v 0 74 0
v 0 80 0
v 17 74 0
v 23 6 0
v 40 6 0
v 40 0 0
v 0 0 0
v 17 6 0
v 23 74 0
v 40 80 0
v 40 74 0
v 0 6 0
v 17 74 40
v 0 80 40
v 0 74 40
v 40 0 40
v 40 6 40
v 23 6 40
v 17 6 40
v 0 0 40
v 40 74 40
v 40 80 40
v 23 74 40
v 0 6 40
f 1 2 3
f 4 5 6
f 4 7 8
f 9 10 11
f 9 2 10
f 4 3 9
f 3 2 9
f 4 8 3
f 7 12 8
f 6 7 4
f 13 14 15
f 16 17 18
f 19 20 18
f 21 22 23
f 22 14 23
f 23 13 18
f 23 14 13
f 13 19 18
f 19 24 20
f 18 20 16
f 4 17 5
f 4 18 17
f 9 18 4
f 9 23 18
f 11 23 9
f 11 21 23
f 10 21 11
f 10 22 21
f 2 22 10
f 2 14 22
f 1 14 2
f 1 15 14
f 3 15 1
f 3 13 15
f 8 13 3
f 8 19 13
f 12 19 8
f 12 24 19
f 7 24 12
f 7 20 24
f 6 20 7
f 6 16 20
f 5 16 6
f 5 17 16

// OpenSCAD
$fn = 32;

// ----------------------------------------------------------------------
// Structural section: ibeam 40 x 80 mm
// ----------------------------------------------------------------------

// --- parameters (mm) ---
sec_w = 40;               // section width, X
sec_h = 80;               // section height, Y
flange_t = 6;             // flange thickness
web_t = 6;                // web thickness
plate_t = 40;             // cut length, Z (extrusion height)
fit_tol = 0.1;            // declared fit tolerance (prompt contract)
free_tol = 0.3;           // declared free tolerance (prompt contract)

profile = [[0, 0], [40, 0], [40, 6], [23, 6], [23, 74], [40, 74], [40, 80], [0, 80], [0, 74], [17, 74], [17, 6], [0, 6]];  // primary outline, 12 points, counter clockwise

// --- the one profile operation ---
linear_extrude(height = plate_t) polygon(points = profile);
